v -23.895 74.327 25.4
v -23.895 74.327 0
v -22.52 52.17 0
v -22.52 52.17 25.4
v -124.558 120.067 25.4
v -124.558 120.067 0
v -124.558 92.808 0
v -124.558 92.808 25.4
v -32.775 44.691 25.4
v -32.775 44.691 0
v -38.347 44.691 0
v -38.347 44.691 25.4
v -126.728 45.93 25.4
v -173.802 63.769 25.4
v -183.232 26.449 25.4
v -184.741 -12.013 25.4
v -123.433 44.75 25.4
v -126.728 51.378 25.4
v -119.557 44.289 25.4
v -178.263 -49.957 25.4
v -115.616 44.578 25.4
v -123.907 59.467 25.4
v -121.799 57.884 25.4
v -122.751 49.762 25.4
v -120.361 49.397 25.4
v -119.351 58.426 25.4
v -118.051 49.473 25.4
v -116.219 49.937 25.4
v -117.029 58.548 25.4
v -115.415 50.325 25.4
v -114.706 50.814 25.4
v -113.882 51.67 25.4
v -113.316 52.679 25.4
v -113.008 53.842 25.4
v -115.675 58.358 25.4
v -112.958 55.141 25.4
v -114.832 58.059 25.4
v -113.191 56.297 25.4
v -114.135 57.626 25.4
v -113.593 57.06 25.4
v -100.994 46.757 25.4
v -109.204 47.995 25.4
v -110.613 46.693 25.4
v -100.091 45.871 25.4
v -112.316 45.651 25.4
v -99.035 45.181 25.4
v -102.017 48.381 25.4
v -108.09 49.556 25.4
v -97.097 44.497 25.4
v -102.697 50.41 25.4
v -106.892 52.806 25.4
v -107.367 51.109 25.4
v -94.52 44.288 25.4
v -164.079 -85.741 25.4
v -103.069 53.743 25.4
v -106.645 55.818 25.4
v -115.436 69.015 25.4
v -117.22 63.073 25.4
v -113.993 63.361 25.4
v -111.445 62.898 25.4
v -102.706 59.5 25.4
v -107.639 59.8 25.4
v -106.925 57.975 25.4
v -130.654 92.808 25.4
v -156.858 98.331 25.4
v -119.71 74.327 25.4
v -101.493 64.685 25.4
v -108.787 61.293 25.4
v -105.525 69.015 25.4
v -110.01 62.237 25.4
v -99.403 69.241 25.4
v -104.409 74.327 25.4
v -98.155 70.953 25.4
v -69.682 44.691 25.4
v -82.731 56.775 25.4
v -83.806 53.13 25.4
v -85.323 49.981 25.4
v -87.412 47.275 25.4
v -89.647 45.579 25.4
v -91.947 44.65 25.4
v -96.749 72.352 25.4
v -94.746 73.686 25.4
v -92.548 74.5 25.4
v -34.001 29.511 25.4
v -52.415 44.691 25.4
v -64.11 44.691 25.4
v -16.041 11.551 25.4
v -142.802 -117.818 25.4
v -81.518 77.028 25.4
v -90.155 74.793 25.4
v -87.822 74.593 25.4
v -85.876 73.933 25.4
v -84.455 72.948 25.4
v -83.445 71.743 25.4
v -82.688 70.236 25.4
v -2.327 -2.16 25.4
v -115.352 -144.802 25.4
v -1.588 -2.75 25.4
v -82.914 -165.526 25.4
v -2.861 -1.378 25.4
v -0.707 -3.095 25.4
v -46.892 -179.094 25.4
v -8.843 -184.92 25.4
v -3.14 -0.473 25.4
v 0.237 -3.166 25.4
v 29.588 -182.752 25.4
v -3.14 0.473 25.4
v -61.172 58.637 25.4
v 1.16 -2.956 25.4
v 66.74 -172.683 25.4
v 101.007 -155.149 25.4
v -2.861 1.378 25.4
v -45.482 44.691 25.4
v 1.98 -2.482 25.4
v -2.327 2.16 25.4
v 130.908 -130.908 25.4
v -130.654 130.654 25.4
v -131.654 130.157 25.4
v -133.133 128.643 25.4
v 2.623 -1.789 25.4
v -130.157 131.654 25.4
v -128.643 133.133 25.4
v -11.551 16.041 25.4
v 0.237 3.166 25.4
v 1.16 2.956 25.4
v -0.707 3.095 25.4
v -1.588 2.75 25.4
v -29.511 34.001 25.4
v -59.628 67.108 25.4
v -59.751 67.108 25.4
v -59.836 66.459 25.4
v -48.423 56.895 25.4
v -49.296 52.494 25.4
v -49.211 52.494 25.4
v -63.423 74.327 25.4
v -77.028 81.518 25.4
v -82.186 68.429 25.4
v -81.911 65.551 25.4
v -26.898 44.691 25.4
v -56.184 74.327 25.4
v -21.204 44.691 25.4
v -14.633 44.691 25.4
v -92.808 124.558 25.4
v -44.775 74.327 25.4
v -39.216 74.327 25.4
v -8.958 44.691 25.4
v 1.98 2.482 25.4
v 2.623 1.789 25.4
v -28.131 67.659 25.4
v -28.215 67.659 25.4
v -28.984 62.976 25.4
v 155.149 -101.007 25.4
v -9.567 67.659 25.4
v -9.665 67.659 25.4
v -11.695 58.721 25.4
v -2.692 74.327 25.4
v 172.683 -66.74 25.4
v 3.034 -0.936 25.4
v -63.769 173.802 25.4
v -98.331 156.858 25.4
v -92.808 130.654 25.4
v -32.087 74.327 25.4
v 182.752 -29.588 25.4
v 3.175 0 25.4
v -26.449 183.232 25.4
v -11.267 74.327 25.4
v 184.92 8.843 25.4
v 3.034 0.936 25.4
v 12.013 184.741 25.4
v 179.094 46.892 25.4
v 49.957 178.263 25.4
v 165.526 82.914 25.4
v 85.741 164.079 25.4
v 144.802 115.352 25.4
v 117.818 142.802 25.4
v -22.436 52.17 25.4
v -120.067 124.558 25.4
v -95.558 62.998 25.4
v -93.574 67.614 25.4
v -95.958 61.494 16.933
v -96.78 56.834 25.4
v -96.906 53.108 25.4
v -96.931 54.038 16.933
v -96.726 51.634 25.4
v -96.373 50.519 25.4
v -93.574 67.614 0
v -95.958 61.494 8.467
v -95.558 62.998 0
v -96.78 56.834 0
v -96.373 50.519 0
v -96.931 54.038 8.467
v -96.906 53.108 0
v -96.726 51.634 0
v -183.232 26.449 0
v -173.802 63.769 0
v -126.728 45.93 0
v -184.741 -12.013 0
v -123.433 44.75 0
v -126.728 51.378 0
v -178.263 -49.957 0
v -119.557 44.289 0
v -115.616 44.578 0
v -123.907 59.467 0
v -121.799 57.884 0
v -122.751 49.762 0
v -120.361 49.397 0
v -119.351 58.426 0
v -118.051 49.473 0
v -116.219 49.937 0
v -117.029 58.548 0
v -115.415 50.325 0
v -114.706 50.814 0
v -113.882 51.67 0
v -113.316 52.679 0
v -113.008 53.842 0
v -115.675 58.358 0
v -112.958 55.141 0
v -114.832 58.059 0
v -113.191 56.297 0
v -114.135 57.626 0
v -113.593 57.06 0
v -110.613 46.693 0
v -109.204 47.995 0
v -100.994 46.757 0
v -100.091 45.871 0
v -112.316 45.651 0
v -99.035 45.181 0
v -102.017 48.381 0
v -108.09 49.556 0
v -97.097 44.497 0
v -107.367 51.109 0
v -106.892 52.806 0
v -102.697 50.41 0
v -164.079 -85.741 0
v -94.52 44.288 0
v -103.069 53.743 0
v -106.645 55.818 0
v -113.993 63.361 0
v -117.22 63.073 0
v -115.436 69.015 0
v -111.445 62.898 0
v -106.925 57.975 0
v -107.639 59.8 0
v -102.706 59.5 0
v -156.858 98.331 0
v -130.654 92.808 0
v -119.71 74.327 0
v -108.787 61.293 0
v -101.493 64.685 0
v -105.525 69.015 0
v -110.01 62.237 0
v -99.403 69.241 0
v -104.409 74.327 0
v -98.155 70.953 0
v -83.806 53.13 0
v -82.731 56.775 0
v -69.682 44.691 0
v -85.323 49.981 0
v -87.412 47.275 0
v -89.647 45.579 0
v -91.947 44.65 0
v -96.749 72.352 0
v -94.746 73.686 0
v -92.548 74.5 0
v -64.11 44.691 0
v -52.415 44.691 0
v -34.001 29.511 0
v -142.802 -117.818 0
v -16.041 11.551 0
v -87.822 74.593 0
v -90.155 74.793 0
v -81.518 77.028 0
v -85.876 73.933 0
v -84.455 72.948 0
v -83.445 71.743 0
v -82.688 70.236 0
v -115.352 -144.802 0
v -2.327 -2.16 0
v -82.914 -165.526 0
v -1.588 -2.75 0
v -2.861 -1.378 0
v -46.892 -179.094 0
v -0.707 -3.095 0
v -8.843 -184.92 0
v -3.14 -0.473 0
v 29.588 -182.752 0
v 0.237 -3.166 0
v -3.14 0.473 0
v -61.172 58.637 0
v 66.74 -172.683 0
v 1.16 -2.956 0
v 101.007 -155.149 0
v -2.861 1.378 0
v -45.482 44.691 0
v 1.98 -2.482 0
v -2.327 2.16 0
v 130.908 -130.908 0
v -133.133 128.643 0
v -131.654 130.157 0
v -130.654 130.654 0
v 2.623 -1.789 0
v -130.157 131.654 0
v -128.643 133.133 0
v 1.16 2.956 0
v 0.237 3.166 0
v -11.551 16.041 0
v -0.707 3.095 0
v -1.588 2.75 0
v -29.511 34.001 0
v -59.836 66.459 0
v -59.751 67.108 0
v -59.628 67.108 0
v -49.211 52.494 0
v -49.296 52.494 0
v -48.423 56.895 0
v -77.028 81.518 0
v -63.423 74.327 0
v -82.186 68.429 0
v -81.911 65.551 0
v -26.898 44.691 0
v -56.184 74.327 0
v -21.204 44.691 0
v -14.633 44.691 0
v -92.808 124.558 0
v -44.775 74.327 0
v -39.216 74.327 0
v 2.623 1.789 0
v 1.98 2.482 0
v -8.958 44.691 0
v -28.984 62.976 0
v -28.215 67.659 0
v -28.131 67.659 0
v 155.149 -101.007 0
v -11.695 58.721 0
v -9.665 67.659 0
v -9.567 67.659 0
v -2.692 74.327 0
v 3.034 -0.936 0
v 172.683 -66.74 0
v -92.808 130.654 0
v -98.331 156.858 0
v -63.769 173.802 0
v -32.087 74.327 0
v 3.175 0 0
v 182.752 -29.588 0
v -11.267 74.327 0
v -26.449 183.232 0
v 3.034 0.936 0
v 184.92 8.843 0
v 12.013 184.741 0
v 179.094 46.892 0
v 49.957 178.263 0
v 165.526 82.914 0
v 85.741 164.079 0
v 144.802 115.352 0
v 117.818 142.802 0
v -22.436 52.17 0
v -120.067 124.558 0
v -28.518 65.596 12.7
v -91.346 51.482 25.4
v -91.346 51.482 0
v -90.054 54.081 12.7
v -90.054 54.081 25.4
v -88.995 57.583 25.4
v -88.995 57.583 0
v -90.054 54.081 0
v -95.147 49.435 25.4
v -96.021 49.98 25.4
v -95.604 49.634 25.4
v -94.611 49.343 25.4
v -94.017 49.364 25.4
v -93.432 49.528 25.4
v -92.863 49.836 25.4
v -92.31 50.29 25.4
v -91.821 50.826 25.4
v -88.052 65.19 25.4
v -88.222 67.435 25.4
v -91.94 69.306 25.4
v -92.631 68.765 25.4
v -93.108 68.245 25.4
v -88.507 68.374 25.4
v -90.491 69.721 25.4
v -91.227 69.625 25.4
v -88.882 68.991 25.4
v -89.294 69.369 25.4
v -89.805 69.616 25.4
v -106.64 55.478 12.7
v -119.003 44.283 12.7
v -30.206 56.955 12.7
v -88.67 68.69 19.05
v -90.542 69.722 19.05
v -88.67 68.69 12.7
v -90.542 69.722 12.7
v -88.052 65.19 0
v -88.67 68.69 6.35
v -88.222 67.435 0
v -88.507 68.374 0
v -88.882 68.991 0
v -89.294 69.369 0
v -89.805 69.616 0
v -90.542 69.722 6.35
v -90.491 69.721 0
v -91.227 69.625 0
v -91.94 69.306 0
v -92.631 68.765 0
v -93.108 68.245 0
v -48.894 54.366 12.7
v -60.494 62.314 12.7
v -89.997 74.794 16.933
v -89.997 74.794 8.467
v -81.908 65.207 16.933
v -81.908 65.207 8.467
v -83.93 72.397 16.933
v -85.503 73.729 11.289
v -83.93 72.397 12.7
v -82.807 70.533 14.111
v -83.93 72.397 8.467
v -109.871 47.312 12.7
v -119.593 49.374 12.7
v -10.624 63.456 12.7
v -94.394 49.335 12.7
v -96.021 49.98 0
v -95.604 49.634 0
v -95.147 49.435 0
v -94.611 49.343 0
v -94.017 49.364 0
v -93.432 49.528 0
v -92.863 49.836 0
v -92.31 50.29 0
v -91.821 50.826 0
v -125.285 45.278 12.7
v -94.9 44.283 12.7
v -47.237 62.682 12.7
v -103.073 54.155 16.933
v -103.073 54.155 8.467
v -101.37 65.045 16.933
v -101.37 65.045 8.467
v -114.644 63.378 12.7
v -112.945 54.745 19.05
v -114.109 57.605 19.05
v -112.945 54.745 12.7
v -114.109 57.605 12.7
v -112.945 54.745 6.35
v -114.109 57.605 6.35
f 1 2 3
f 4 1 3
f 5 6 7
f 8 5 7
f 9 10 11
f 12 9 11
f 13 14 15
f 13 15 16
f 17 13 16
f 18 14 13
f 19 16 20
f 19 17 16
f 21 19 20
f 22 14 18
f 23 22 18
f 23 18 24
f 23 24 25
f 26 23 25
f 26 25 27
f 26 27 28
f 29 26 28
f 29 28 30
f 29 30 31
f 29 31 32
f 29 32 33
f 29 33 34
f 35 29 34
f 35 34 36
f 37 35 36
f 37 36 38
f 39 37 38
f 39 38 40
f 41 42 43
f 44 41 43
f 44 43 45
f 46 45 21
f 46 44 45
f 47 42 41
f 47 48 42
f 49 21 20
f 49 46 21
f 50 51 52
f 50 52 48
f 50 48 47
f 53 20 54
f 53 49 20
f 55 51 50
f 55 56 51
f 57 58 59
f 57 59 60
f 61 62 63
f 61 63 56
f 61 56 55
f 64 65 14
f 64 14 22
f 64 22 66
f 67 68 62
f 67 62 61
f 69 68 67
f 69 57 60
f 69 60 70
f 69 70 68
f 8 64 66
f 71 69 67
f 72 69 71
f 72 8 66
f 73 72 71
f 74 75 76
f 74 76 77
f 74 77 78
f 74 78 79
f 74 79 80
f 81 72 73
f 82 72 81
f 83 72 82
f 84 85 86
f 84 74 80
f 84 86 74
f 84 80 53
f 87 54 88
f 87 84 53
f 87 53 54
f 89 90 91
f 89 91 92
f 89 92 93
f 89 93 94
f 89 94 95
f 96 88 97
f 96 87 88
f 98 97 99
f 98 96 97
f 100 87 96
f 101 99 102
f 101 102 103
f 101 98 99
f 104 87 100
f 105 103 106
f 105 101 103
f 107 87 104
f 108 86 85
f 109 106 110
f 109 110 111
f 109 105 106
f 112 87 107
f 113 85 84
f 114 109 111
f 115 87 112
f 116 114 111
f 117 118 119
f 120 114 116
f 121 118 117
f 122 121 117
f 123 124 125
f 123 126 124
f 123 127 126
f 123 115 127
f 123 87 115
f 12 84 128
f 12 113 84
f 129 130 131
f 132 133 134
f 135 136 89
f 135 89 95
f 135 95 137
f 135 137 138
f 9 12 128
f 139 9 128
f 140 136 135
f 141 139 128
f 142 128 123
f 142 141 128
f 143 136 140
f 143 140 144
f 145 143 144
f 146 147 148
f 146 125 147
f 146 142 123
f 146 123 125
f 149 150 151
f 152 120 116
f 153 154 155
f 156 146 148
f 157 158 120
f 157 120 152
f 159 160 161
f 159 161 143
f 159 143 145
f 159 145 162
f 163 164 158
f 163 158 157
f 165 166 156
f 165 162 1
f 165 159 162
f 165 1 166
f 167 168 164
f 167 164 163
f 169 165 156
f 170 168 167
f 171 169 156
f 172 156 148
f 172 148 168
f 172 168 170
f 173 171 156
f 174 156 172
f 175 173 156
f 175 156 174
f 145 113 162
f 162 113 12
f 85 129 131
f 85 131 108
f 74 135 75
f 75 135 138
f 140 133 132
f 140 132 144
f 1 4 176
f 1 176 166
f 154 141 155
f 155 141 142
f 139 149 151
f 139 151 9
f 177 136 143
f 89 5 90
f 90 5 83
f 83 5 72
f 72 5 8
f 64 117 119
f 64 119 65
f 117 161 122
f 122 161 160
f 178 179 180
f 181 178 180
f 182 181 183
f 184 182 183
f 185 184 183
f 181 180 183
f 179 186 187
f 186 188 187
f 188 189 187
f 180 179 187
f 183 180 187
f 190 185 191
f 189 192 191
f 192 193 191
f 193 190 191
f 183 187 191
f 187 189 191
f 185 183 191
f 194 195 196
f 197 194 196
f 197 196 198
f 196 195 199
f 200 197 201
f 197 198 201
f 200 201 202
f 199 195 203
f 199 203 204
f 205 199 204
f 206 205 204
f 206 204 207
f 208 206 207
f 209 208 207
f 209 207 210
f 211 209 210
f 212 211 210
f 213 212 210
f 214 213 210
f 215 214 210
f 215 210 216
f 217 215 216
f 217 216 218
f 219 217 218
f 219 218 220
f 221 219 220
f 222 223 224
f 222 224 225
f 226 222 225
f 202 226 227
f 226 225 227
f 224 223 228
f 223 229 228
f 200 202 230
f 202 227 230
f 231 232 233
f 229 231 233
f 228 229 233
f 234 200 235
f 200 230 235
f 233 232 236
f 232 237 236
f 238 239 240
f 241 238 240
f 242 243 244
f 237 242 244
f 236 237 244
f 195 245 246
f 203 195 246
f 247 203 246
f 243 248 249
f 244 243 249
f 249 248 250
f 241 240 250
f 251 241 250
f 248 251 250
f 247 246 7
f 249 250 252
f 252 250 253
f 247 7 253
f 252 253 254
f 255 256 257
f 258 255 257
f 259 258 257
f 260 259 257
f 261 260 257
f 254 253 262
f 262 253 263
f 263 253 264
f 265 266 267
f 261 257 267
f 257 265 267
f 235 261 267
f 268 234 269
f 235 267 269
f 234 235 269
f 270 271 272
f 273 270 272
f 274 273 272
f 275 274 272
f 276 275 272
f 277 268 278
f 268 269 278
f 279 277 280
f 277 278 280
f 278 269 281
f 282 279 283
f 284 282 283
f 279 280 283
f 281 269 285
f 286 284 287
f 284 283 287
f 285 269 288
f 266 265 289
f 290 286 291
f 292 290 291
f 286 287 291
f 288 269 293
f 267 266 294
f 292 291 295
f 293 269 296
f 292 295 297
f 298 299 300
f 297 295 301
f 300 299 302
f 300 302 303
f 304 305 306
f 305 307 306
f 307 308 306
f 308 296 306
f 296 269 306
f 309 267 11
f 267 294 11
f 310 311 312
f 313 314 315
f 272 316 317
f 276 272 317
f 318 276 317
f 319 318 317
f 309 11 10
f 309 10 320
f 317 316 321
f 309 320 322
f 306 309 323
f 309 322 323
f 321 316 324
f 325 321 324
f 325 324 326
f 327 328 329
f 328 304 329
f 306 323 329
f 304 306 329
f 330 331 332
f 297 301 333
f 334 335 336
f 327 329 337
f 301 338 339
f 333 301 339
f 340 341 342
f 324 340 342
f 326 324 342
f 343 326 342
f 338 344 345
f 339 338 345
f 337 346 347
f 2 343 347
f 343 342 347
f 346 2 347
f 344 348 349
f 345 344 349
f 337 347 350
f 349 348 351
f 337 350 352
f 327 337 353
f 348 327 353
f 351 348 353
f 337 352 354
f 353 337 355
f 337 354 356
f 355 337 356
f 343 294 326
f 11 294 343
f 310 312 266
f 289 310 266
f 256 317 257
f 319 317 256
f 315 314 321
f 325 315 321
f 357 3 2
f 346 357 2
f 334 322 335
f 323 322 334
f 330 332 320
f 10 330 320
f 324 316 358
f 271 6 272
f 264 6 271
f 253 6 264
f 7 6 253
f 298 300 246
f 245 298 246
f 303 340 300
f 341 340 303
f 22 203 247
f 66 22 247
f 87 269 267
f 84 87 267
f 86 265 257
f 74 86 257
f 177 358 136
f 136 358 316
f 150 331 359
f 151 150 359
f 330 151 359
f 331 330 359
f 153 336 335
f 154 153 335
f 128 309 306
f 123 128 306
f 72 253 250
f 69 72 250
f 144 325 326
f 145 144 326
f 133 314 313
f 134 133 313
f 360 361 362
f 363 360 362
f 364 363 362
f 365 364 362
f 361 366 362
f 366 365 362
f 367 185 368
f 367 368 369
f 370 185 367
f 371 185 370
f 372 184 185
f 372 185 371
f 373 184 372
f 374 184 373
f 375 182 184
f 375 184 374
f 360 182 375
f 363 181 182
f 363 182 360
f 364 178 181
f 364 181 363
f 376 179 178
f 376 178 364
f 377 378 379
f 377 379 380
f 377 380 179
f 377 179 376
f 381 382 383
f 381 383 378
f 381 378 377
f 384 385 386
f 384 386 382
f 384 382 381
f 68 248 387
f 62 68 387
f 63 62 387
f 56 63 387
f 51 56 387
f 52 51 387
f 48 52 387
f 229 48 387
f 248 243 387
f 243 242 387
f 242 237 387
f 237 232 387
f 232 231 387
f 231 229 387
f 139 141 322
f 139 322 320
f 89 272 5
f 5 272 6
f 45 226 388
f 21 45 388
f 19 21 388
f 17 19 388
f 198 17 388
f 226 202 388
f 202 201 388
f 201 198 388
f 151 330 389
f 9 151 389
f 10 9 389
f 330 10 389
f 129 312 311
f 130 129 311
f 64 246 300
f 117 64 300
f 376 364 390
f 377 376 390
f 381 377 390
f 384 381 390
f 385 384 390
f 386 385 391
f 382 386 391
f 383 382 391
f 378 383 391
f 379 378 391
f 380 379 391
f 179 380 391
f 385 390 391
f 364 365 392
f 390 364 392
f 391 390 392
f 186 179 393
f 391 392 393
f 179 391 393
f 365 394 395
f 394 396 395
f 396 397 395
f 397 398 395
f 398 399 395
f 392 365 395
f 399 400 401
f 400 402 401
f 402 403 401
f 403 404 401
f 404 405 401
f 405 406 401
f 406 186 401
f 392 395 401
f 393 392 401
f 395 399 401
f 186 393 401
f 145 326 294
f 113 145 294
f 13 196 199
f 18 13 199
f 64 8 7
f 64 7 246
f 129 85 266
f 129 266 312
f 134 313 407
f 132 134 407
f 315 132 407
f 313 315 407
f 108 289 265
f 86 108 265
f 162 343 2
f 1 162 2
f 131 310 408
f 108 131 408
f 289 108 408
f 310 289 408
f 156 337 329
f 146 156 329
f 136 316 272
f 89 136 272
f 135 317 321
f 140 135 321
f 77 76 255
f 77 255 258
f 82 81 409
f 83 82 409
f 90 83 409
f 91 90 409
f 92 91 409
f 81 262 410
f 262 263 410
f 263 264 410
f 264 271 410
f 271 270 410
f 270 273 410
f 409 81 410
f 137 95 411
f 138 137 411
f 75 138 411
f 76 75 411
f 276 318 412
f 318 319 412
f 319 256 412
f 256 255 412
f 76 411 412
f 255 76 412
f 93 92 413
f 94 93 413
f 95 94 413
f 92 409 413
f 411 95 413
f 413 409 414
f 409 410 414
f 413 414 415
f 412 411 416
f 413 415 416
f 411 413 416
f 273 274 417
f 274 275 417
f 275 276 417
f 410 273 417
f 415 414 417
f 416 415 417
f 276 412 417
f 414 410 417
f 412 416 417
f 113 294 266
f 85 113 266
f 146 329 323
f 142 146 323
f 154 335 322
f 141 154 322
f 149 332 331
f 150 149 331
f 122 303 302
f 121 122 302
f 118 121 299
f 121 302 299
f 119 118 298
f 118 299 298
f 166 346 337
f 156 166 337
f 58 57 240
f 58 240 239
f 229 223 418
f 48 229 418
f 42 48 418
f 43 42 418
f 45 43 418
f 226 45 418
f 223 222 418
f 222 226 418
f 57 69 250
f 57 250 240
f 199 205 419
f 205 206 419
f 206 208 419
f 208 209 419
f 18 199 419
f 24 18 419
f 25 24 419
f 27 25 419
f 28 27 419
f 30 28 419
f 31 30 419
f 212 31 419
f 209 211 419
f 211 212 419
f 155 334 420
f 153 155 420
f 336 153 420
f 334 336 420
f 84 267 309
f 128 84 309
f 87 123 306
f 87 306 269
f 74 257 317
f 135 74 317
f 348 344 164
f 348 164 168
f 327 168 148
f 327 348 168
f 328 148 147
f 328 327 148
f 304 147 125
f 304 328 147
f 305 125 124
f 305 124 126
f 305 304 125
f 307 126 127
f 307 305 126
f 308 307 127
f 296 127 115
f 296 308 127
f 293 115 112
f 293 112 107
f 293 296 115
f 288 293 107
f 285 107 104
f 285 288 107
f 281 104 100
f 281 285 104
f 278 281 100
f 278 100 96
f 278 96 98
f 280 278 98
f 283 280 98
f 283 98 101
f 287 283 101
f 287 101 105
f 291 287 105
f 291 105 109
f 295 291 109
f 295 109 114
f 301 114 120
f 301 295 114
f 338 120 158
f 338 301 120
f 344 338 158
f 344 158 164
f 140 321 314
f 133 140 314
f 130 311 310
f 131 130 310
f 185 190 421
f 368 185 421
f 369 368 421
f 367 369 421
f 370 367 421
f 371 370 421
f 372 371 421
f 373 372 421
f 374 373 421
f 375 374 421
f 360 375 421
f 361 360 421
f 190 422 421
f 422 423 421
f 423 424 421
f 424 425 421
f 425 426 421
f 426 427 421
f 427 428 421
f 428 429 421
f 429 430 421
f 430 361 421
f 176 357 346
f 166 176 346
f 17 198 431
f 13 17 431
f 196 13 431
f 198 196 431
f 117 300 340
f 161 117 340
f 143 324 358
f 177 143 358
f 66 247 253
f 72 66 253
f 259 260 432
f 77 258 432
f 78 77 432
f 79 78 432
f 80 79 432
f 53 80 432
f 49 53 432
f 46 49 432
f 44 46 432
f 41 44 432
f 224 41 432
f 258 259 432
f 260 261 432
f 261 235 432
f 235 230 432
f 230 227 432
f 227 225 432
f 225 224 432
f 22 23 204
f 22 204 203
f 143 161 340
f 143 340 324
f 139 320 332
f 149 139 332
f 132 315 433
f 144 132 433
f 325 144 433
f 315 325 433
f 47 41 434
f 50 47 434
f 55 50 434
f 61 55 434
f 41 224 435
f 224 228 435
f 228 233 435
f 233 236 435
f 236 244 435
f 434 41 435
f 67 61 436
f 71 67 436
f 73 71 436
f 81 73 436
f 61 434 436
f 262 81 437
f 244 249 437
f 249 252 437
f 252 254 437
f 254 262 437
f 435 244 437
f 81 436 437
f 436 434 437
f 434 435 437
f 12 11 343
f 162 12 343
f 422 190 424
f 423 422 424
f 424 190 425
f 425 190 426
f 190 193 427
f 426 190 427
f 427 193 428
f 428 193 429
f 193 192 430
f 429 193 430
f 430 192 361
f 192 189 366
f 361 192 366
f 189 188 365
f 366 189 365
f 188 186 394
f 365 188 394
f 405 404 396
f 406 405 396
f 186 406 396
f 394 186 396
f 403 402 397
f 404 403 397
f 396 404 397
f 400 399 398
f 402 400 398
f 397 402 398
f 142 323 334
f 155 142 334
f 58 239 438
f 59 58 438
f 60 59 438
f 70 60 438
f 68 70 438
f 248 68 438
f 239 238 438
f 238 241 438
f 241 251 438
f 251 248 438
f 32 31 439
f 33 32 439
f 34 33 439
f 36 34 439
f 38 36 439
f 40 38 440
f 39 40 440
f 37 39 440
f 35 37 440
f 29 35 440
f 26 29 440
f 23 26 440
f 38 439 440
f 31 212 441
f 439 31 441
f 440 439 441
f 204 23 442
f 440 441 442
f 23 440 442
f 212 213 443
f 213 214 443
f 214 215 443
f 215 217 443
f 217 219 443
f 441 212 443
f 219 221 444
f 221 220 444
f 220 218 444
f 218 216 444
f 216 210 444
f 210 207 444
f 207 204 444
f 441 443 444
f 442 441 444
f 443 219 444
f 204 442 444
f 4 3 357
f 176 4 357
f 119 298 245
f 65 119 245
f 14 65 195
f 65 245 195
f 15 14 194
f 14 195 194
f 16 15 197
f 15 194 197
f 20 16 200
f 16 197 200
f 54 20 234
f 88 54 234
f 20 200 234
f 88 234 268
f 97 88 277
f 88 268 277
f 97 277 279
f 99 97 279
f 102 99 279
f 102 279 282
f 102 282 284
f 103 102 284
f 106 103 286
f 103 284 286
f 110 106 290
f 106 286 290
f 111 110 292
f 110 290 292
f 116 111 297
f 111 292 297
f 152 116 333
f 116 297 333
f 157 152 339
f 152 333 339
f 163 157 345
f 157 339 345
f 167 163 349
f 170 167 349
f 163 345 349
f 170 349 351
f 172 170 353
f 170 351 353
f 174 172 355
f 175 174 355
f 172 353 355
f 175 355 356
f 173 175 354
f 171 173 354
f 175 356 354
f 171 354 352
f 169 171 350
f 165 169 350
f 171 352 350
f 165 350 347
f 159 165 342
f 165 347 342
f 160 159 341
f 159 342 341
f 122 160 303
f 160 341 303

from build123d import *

# Parameters (mm, degrees)
F0_R     = 3.175
F1_DEPTH = 25.4


with BuildPart() as f1:
    # F0 (on Top) → F1 (new body)
    with BuildSketch(Plane.XY):
        with BuildLine():
            ThreePointArc((-133.1333395345, 128.643211474), (-69.377326194, -171.6401717668), (185.131202, 0))
            ThreePointArc((185.131202, 0), (72.3107515679, 170.4251071927), (-128.643211474, 133.1333395345))
            ThreePointArc((-128.643211474, 133.1333395345), (-130.9075283434, 130.9075283434), (-133.1333395345, 128.643211474))
        make_face()
        Circle(F0_R, mode=Mode.SUBTRACT)
        with BuildLine():
            add(Edge.make_bspline(
                [(-117.2195194436, 63.0731906782), (-115.760113076, 63.3780444528), (-114.6444779861, 63.3780444528)],
                knots=[0, 0, 0, 1, 1, 1], degree=2))
            add(Edge.make_bspline(
                [(-114.6444779861, 63.3780444528), (-110.9343426872, 63.3780444528), (-108.7873937642, 61.2927149098)],
                knots=[0, 0, 0, 1, 1, 1], degree=2))
            add(Edge.make_bspline(
                [(-108.7873937642, 61.2927149098), (-106.6404448413, 59.2073853668), (-106.6404448413, 55.4777913163)],
                knots=[0, 0, 0, 1, 1, 1], degree=2))
            add(Edge.make_bspline(
                [(-106.6404448413, 55.4777913163), (-106.6404448413, 52.0919685436), (-108.0901218331, 49.5558445892)],
                knots=[0, 0, 0, 1, 1, 1], degree=2))
            add(Edge.make_bspline(
                [(-108.0901218331, 49.5558445892), (-109.5397988249, 47.0197206349), (-112.3159140485, 45.6511217747)],
                knots=[0, 0, 0, 1, 1, 1], degree=2))
            add(Edge.make_bspline(
                [(-112.3159140485, 45.6511217747), (-115.0920292722, 44.2825229144), (-119.0032383373, 44.2825229144)],
                knots=[0, 0, 0, 1, 1, 1], degree=2))
            add(Edge.make_bspline(
                [(-119.0032383373, 44.2825229144), (-121.3772060285, 44.2825229144), (-123.4333474442, 44.749532952)],
                knots=[0, 0, 0, 1, 1, 1], degree=2))
            add(Edge.make_bspline(
                [(-123.4333474442, 44.749532952), (-125.4894888598, 45.2165429897), (-126.7283627096, 45.9300305471)],
                knots=[0, 0, 0, 1, 1, 1], degree=2))
            Line((-126.7283627096, 45.9300305471), (-126.7283627096, 51.3784809861))
            add(Edge.make_bspline(
                [(-126.7283627096, 51.3784809861), (-123.1998424253, 49.3742295746), (-119.5934871348, 49.3742295746)],
                knots=[0, 0, 0, 1, 1, 1], degree=2))
            add(Edge.make_bspline(
                [(-119.5934871348, 49.3742295746), (-116.4671143829, 49.3742295746), (-114.7060973661, 50.8141771906)],
                knots=[0, 0, 0, 1, 1, 1], degree=2))
            add(Edge.make_bspline(
                [(-114.7060973661, 50.8141771906), (-112.9450803492, 52.2541248066), (-112.9450803492, 54.7448450073)],
                knots=[0, 0, 0, 1, 1, 1], degree=2))
            add(Edge.make_bspline(
                [(-112.9450803492, 54.7448450073), (-112.9450803492, 56.6518026609), (-114.109362318, 57.6052814877)],
                knots=[0, 0, 0, 1, 1, 1], degree=2))
            add(Edge.make_bspline(
                [(-114.109362318, 57.6052814877), (-115.2736442868, 58.5587603145), (-117.485455715, 58.5587603145)],
                knots=[0, 0, 0, 1, 1, 1], degree=2))
            add(Edge.make_bspline(
                [(-117.485455715, 58.5587603145), (-119.5480833811, 58.5587603145), (-121.7988123125, 57.8841902602)],
                knots=[0, 0, 0, 1, 1, 1], degree=2))
            Line((-121.7988123125, 57.8841902602), (-123.9068437323, 59.4668353877))
            Line((-123.9068437323, 59.4668353877), (-119.7102396442, 74.3268353349))
            Line((-119.7102396442, 74.3268353349), (-104.4091746615, 74.3268353349))
            Line((-104.4091746615, 74.3268353349), (-105.5248097514, 69.0145961569))
            Line((-105.5248097514, 69.0145961569), (-115.4358005499, 69.0145961569))
            Line((-115.4358005499, 69.0145961569), (-117.2195194436, 63.0731906782))
        make_face(mode=Mode.SUBTRACT)
        Polygon((-11.5505048452, 16.0406329059), (-16.0406329058, 11.5505048454), (-34.0011451479, 29.5110170875), (-29.5110170874, 34.0011451481), align=None, mode=Mode.SUBTRACT)
        with BuildLine():
            add(Edge.make_bspline(
                [(-89.9967260004, 74.7938453725), (-81.9083715988, 74.7938453725), (-81.9083715988, 65.2071671002)],
                knots=[0, 0, 0, 1, 1, 1], degree=2))
            add(Edge.make_bspline(
                [(-81.9083715988, 65.2071671002), (-81.9083715988, 55.6788650825), (-85.3233824989, 49.9806939985)],
                knots=[0, 0, 0, 1, 1, 1], degree=2))
            add(Edge.make_bspline(
                [(-85.3233824989, 49.9806939985), (-88.738393399, 44.2825229144), (-94.9003313955, 44.2825229144)],
                knots=[0, 0, 0, 1, 1, 1], degree=2))
            add(Edge.make_bspline(
                [(-94.9003313955, 44.2825229144), (-98.9153204689, 44.2825229144), (-100.9941637614, 46.7570274888)],
                knots=[0, 0, 0, 1, 1, 1], degree=2))
            add(Edge.make_bspline(
                [(-100.9941637614, 46.7570274888), (-103.0730070539, 49.2315320631), (-103.0730070539, 54.1545962097)],
                knots=[0, 0, 0, 1, 1, 1], degree=2))
            add(Edge.make_bspline(
                [(-103.0730070539, 54.1545962097), (-103.0730070539, 60.1803229452), (-101.3703662917, 65.0450108371)],
                knots=[0, 0, 0, 1, 1, 1], degree=2))
            add(Edge.make_bspline(
                [(-101.3703662917, 65.0450108371), (-99.6677255295, 69.909698729), (-96.7489127944, 72.3517720507)],
                knots=[0, 0, 0, 1, 1, 1], degree=2))
            add(Edge.make_bspline(
                [(-96.7489127944, 72.3517720507), (-93.8301000592, 74.7938453725), (-89.9967260004, 74.7938453725)],
                knots=[0, 0, 0, 1, 1, 1], degree=2))
        make_face(mode=Mode.SUBTRACT)
        with BuildLine():
            Line((-39.2158706593, 74.3268353349), (-45.4815886641, 44.6911566973))
            Line((-45.4815886641, 44.6911566973), (-52.4153904727, 44.6911566973))
            Line((-52.4153904727, 44.6911566973), (-59.6281010538, 67.1076385033))
            Line((-59.6281010538, 67.1076385033), (-59.7513398137, 67.1076385033))
            Line((-59.7513398137, 67.1076385033), (-59.8356610705, 66.459013451))
            add(Edge.make_bspline(
                [(-59.8356610705, 66.459013451), (-60.4842861228, 62.0807943483), (-61.1718286782, 58.6365953208)],
                knots=[0, 0, 0, 1, 1, 1], degree=2))
            Line((-61.1718286782, 58.6365953208), (-64.1101001649, 44.6911566973))
            Line((-64.1101001649, 44.6911566973), (-69.6817893638, 44.6911566973))
            Line((-69.6817893638, 44.6911566973), (-63.4225576095, 74.3268353349))
            Line((-63.4225576095, 74.3268353349), (-56.1839020263, 74.3268353349))
            Line((-56.1839020263, 74.3268353349), (-49.2955039714, 52.494116076))
            Line((-49.2955039714, 52.494116076), (-49.2111827146, 52.494116076))
            add(Edge.make_bspline(
                [(-49.2111827146, 52.494116076), (-48.9711914453, 54.0378437003), (-48.4231032761, 56.8950370555)],
                knots=[0, 0, 0, 1, 1, 1], degree=2))
            add(Edge.make_bspline(
                [(-48.4231032761, 56.8950370555), (-47.875015107, 59.7522304107), (-44.7745873572, 74.3268353349)],
                knots=[0, 0, 0, 1, 1, 1], degree=2))
            Line((-44.7745873572, 74.3268353349), (-39.2158706593, 74.3268353349))
        make_face(mode=Mode.SUBTRACT)
        with BuildLine():
            Line((-22.5202618143, 52.1698035498), (-22.4359405575, 52.1698035498))
            Line((-22.4359405575, 52.1698035498), (-11.2666171577, 74.3268353349))
            Line((-11.2666171577, 74.3268353349), (-2.6917939669, 74.3268353349))
            Line((-2.6917939669, 74.3268353349), (-8.9575119716, 44.6911566973))
            Line((-8.9575119716, 44.6911566973), (-14.6329811789, 44.6911566973))
            Line((-14.6329811789, 44.6911566973), (-11.6947096922, 58.7209165776))
            add(Edge.make_bspline(
                [(-11.6947096922, 58.7209165776), (-10.6179921054, 63.7218157305), (-9.5672195208, 67.6589697977)],
                knots=[0, 0, 0, 1, 1, 1], degree=2))
            Line((-9.5672195208, 67.6589697977), (-9.6645132786, 67.6589697977))
            Line((-9.6645132786, 67.6589697977), (-21.2035529582, 44.6911566973))
            Line((-21.2035529582, 44.6911566973), (-26.898480917, 44.6911566973))
            Line((-26.898480917, 44.6911566973), (-28.1308685163, 67.6589697977))
            Line((-28.1308685163, 67.6589697977), (-28.2151897731, 67.6589697977))
            add(Edge.make_bspline(
                [(-28.2151897731, 67.6589697977), (-28.4357222909, 65.875250904), (-28.98381046, 62.9758969204)],
                knots=[0, 0, 0, 1, 1, 1], degree=2))
            add(Edge.make_bspline(
                [(-28.98381046, 62.9758969204), (-29.5318986292, 60.0765429368), (-32.7750238905, 44.6911566973)],
                knots=[0, 0, 0, 1, 1, 1], degree=2))
            Line((-32.7750238905, 44.6911566973), (-38.3467130893, 44.6911566973))
            Line((-38.3467130893, 44.6911566973), (-32.0874813351, 74.3268353349))
            Line((-32.0874813351, 74.3268353349), (-23.8953469251, 74.3268353349))
            Line((-23.8953469251, 74.3268353349), (-22.5202618143, 52.1698035498))
        make_face(mode=Mode.SUBTRACT)
        Polygon((-92.8075283434, 124.5575283434), (-120.0674002829, 124.5575283434), (-77.0277165371, 81.5178445977), (-81.5178445976, 77.0277165372), (-124.5575283434, 120.0674002829), (-124.5575283434, 92.8075283434), (-130.6535283434, 92.8075283434), (-130.6535283434, 130.6535283434), (-92.8075283434, 130.6535283434), align=None, mode=Mode.SUBTRACT)
    extrude(amount=F1_DEPTH)


with BuildPart() as f1b:
    # F0 (on Top) → F1, piece 2 (new body)
    with BuildSketch(Plane.XY):
        with BuildLine():
            add(Edge.make_bspline(
                [(-88.6702877685, 68.6902836308), (-89.2897246934, 69.7215974639), (-90.5415710443, 69.7215974639)],
                knots=[0, 0, 0, 1, 1, 1], degree=2))
            add(Edge.make_bspline(
                [(-90.5415710443, 69.7215974639), (-92.1631336749, 69.7215974639), (-93.5738931636, 67.613566044)],
                knots=[0, 0, 0, 1, 1, 1], degree=2))
            add(Edge.make_bspline(
                [(-93.5738931636, 67.613566044), (-94.9846526522, 65.5055346242), (-95.9575902306, 61.493788676)],
                knots=[0, 0, 0, 1, 1, 1], degree=2))
            add(Edge.make_bspline(
                [(-95.9575902306, 61.493788676), (-96.930527809, 57.4820427278), (-96.930527809, 54.0378437003)],
                knots=[0, 0, 0, 1, 1, 1], degree=2))
            add(Edge.make_bspline(
                [(-96.930527809, 54.0378437003), (-96.930527809, 51.7027935122), (-96.3727102641, 50.5190527918)],
                knots=[0, 0, 0, 1, 1, 1], degree=2))
            add(Edge.make_bspline(
                [(-96.3727102641, 50.5190527918), (-95.8148927191, 49.3353120715), (-94.3944038547, 49.3353120715)],
                knots=[0, 0, 0, 1, 1, 1], degree=2))
            add(Edge.make_bspline(
                [(-94.3944038547, 49.3353120715), (-92.7533824725, 49.3353120715), (-91.3458661091, 51.4822609944)],
                knots=[0, 0, 0, 1, 1, 1], degree=2))
            add(Edge.make_bspline(
                [(-91.3458661091, 51.4822609944), (-89.9383497457, 53.6292099174), (-88.9946002947, 57.5825796109)],
                knots=[0, 0, 0, 1, 1, 1], degree=2))
            add(Edge.make_bspline(
                [(-88.9946002947, 57.5825796109), (-88.0508508436, 61.5359493044), (-88.0508508436, 65.4082408664)],
                knots=[0, 0, 0, 1, 1, 1], degree=2))
            add(Edge.make_bspline(
                [(-88.0508508436, 65.4082408664), (-88.0508508436, 67.6589697977), (-88.6702877685, 68.6902836308)],
                knots=[0, 0, 0, 1, 1, 1], degree=2))
        make_face()
    extrude(amount=F1_DEPTH)


solid = Compound([f1.part, f1b.part])
